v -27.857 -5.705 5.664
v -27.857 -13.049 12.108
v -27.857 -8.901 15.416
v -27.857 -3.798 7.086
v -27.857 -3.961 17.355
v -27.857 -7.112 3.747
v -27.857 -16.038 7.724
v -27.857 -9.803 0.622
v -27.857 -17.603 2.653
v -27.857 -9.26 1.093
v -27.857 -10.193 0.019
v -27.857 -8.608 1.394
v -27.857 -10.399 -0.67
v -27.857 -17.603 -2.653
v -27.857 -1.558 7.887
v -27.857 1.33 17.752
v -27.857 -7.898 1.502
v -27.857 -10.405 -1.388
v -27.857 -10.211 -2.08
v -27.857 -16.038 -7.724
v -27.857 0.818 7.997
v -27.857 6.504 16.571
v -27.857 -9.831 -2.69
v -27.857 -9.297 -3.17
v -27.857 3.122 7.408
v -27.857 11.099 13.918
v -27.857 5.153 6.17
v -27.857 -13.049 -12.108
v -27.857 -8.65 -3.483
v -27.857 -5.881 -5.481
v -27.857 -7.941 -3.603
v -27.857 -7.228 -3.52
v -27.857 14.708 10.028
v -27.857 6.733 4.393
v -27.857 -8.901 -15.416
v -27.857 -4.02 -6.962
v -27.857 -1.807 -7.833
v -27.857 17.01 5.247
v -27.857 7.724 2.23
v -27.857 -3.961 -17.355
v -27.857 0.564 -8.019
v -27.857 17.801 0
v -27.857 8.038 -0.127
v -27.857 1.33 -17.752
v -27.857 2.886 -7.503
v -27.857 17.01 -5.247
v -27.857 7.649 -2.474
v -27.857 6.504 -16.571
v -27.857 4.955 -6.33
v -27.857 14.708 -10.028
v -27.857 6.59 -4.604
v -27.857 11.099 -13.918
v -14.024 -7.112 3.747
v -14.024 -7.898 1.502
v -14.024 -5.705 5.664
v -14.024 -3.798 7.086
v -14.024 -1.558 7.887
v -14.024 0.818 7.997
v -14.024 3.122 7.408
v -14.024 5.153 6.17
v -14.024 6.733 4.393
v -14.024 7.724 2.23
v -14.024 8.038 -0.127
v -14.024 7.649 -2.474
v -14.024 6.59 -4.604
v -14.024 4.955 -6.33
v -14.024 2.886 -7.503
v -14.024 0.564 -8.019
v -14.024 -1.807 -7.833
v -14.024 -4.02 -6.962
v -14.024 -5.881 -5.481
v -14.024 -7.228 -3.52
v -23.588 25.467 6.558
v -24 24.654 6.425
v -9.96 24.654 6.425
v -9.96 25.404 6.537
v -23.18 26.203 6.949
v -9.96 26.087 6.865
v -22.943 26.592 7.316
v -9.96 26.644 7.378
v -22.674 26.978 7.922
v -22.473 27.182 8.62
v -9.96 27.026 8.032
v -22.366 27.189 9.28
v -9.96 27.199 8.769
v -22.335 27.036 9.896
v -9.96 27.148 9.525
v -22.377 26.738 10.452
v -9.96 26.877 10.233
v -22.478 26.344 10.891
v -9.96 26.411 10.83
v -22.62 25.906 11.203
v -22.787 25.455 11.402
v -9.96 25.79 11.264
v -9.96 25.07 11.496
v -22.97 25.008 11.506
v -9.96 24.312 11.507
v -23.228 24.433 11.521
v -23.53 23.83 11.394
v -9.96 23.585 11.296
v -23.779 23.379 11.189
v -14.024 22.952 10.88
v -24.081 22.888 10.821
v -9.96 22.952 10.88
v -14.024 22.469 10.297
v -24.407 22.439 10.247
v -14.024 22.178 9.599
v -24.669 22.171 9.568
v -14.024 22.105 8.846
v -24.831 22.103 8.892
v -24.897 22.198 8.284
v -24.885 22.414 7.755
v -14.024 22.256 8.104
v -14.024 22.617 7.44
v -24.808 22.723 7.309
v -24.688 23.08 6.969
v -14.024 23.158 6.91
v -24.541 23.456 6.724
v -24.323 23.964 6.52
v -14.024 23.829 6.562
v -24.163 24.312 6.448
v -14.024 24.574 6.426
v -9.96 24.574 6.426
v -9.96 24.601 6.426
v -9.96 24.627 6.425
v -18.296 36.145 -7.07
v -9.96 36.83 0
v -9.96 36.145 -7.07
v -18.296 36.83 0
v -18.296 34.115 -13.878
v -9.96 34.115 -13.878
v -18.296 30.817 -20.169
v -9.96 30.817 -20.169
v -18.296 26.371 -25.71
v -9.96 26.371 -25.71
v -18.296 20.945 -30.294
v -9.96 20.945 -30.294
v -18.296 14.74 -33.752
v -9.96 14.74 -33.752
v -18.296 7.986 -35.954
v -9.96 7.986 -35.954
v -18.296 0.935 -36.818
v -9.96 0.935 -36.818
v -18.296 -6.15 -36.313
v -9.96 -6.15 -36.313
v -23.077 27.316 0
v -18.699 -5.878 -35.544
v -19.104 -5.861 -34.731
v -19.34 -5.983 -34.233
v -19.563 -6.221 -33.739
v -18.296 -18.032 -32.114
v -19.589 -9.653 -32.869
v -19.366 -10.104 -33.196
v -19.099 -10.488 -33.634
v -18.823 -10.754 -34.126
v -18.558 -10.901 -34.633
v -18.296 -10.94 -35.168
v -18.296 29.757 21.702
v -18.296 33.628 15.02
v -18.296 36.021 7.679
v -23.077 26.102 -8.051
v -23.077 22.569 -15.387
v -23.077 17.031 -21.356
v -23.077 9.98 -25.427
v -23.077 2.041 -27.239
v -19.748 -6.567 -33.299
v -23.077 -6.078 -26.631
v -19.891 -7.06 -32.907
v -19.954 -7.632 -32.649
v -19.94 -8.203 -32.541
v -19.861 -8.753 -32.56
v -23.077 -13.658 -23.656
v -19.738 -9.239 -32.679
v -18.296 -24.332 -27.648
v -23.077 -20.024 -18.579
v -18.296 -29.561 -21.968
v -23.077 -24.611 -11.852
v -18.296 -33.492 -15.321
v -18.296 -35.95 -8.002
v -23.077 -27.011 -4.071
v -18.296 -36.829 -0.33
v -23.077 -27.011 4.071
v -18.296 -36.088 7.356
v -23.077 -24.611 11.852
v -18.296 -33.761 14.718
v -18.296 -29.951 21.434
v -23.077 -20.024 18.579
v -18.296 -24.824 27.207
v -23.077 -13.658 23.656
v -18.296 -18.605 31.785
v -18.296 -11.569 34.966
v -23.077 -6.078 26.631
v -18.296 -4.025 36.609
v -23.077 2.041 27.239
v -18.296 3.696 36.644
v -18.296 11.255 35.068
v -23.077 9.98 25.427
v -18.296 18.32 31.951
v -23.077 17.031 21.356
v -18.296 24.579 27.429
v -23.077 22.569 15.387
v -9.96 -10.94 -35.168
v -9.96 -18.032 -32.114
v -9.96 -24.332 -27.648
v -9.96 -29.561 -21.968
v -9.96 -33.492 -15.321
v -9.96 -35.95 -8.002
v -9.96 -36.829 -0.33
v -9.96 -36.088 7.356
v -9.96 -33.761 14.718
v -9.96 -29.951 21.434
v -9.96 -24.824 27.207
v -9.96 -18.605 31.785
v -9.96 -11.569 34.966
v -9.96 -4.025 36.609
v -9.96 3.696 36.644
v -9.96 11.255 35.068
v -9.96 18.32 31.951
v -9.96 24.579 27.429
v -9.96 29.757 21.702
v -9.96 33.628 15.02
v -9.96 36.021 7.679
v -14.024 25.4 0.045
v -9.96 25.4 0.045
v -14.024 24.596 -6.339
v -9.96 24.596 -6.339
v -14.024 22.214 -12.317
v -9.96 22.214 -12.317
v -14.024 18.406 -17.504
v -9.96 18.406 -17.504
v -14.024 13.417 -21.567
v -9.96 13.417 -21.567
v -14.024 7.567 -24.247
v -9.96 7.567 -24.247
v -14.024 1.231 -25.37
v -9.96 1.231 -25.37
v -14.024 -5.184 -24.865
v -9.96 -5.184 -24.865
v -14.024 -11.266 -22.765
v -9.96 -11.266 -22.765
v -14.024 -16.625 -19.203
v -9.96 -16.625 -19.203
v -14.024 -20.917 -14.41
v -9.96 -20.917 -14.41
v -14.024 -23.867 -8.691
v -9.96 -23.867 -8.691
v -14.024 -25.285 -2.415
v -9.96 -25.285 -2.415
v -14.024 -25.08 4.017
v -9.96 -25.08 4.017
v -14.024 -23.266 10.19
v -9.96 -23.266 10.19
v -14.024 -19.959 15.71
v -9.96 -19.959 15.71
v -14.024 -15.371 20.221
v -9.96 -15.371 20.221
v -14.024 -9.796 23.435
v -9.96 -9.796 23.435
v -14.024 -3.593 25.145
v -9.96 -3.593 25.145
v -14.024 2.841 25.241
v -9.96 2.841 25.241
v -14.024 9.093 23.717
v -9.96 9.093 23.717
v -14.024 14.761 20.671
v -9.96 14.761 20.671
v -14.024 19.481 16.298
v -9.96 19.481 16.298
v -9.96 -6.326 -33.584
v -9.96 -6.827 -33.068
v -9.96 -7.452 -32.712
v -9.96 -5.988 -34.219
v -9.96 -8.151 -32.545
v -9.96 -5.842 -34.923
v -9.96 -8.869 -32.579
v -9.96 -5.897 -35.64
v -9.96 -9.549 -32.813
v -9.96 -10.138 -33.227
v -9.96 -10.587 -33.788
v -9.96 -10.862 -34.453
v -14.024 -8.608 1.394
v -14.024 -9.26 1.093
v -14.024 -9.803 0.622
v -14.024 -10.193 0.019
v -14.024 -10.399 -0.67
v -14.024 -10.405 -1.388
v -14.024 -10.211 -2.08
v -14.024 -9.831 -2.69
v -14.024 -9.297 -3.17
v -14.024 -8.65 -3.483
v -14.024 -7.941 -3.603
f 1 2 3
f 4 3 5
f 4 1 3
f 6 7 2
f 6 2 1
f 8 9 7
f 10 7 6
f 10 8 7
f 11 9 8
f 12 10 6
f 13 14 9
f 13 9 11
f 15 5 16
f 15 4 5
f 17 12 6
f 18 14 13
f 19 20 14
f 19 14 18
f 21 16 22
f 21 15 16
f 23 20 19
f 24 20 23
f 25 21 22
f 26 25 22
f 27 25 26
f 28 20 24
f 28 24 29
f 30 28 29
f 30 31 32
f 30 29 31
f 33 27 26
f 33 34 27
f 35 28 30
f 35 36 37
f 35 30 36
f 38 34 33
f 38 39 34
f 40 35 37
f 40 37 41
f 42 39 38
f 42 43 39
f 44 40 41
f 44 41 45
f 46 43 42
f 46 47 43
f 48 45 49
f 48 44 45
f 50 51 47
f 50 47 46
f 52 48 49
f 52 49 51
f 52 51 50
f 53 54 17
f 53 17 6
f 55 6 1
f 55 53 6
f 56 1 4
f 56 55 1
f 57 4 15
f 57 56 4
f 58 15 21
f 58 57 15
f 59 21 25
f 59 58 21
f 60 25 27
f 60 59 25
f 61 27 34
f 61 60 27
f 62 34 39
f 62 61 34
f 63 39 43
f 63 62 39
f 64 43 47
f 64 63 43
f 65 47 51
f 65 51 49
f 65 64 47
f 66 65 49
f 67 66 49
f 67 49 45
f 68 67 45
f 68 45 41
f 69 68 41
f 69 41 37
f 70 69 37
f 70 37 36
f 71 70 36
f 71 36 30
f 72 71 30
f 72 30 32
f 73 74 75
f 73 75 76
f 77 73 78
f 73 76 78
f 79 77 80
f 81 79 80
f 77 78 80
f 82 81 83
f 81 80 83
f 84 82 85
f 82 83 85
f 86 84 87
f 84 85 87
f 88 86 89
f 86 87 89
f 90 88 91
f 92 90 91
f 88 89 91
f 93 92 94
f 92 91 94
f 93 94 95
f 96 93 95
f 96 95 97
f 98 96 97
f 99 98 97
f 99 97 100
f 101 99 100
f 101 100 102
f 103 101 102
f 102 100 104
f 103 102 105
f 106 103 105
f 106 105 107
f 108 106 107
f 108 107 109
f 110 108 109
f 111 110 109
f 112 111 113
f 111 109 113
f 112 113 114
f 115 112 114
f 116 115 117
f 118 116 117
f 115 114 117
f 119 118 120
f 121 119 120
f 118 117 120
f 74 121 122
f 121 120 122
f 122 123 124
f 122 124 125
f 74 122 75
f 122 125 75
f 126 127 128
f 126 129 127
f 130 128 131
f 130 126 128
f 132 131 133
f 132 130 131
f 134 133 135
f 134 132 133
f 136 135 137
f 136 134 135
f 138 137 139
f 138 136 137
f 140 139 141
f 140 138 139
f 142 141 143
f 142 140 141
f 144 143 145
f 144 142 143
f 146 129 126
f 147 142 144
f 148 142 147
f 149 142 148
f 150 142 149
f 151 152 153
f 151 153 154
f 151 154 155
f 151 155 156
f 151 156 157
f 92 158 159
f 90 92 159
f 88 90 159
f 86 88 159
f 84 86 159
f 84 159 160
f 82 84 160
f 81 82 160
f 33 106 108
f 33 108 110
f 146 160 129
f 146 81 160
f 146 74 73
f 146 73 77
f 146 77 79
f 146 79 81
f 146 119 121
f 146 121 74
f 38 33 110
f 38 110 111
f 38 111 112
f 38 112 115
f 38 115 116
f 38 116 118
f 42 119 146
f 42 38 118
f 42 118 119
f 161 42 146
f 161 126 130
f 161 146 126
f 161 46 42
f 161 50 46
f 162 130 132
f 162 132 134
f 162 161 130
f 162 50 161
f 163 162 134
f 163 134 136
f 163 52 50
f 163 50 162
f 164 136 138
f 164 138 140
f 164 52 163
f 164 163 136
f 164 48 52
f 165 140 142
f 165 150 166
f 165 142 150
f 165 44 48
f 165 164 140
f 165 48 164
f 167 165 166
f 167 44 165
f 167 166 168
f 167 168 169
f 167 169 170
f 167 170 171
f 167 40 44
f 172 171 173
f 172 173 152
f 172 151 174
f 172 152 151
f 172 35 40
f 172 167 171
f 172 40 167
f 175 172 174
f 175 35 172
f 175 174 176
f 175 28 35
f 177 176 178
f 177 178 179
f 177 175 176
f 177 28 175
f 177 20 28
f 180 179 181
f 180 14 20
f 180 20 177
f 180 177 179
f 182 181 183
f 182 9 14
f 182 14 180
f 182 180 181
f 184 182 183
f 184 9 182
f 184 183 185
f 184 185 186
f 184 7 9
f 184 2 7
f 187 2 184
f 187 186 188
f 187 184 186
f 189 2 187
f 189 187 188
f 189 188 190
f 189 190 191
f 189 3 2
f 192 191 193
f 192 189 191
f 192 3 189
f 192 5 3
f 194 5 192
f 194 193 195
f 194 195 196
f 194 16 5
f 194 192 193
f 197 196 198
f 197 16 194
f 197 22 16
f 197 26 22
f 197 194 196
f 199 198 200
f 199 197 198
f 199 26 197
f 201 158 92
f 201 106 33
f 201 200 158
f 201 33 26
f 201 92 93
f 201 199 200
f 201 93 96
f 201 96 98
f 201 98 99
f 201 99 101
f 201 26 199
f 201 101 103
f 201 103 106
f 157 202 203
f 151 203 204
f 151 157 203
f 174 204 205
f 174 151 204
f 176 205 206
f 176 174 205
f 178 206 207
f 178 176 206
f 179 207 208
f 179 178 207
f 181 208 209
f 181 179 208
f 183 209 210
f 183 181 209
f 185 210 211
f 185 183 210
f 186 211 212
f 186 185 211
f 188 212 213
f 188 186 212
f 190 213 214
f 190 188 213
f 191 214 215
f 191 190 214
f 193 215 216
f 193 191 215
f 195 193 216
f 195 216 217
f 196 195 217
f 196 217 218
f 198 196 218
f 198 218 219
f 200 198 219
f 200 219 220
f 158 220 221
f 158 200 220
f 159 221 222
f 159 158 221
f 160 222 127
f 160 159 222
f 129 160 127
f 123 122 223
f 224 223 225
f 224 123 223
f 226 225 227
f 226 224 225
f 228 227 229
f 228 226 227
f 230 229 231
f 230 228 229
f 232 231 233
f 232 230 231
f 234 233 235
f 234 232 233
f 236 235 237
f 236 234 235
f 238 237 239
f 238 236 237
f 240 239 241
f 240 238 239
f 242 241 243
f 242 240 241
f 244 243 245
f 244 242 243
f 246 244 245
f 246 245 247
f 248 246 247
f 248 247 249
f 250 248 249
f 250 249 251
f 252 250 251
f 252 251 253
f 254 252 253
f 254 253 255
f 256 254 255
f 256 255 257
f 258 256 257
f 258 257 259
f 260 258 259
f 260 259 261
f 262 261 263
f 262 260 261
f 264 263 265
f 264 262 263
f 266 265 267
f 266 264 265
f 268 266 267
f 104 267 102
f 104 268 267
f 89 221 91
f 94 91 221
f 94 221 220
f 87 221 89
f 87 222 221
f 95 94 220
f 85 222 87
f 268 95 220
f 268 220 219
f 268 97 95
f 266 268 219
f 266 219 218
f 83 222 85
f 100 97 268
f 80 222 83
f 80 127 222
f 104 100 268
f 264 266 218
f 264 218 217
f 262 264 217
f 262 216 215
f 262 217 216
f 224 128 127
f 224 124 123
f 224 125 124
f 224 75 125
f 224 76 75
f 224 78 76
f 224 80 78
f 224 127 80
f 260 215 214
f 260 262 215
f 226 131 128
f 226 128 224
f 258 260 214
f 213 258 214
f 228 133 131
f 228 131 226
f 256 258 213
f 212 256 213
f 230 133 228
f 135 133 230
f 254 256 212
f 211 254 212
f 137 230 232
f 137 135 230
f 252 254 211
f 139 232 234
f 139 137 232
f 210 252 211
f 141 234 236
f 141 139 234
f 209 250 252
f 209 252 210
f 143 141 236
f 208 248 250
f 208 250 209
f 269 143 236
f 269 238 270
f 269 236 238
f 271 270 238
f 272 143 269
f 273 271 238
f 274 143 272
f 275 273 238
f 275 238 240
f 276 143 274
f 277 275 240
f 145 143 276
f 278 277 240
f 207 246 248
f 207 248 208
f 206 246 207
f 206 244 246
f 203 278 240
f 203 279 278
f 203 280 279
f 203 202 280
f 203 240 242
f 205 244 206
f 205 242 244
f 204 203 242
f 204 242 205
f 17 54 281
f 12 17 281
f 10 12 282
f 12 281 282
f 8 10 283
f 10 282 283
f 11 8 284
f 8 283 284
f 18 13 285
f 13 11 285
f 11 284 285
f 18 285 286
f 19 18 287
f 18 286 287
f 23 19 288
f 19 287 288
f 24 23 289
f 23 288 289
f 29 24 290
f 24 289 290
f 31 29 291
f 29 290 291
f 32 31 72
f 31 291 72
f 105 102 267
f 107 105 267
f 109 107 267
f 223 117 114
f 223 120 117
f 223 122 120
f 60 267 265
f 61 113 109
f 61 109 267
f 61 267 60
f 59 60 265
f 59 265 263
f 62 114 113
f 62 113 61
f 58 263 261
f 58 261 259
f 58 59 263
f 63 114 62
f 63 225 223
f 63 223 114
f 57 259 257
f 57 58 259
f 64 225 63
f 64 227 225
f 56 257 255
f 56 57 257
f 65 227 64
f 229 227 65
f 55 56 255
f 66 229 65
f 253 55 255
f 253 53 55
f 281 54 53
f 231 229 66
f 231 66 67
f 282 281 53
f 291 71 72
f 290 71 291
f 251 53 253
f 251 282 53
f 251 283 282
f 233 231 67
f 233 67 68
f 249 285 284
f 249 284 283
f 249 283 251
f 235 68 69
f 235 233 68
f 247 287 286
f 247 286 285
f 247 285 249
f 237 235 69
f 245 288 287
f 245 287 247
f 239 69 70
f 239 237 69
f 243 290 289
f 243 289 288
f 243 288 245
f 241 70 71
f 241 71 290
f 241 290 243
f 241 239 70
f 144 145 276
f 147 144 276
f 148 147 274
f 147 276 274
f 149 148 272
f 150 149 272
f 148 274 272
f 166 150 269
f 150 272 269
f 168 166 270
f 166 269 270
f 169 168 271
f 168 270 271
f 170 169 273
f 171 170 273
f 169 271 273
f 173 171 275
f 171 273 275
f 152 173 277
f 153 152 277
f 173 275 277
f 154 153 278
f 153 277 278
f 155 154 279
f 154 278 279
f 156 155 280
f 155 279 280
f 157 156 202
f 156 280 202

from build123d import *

# Parameters (mm, degrees)
SKETCH2_R          = 2.5527
CUT_EXTRUDE1_DEPTH = 18.897183893


with BuildPart() as part:
    # Sketch1 → Revolve1 (revolve)
    with BuildSketch(Plane.XY):
        Polygon((-27.857278892, 8.0391), (-14.024094998, 8.0391), (-14.024094998, 25.4), (-9.960094998, 25.4), (-9.960094998, 36.83), (-18.295757287, 36.83), (-27.857278892, 17.801339222), align=None)
    revolve(axis=Axis((0, 0, 0), (-1, 0, 0)))

    # Sketch2 → Cut-Extrude1 (cut, through all)
    with BuildSketch(Plane(origin=(-9.960094998, 0, 0), x_dir=(0, 0, -1), z_dir=(1, 0, 0))):
        with Locations((35.086604814, -8.389036369)):
            Circle(SKETCH2_R)
        with Locations((1.050672613, -7.874611544)):
            Circle(SKETCH2_R)
        with Locations((18.860257121, 44.244090147)):
            Circle(SKETCH2_R)
        with Locations((46.093533365, 23.822092726)):
            Circle(SKETCH2_R)
        with Locations((-8.977761775, 24.654449577)):
            Circle(SKETCH2_R)
    extrude(amount=-CUT_EXTRUDE1_DEPTH, mode=Mode.SUBTRACT)


solid = part.part
